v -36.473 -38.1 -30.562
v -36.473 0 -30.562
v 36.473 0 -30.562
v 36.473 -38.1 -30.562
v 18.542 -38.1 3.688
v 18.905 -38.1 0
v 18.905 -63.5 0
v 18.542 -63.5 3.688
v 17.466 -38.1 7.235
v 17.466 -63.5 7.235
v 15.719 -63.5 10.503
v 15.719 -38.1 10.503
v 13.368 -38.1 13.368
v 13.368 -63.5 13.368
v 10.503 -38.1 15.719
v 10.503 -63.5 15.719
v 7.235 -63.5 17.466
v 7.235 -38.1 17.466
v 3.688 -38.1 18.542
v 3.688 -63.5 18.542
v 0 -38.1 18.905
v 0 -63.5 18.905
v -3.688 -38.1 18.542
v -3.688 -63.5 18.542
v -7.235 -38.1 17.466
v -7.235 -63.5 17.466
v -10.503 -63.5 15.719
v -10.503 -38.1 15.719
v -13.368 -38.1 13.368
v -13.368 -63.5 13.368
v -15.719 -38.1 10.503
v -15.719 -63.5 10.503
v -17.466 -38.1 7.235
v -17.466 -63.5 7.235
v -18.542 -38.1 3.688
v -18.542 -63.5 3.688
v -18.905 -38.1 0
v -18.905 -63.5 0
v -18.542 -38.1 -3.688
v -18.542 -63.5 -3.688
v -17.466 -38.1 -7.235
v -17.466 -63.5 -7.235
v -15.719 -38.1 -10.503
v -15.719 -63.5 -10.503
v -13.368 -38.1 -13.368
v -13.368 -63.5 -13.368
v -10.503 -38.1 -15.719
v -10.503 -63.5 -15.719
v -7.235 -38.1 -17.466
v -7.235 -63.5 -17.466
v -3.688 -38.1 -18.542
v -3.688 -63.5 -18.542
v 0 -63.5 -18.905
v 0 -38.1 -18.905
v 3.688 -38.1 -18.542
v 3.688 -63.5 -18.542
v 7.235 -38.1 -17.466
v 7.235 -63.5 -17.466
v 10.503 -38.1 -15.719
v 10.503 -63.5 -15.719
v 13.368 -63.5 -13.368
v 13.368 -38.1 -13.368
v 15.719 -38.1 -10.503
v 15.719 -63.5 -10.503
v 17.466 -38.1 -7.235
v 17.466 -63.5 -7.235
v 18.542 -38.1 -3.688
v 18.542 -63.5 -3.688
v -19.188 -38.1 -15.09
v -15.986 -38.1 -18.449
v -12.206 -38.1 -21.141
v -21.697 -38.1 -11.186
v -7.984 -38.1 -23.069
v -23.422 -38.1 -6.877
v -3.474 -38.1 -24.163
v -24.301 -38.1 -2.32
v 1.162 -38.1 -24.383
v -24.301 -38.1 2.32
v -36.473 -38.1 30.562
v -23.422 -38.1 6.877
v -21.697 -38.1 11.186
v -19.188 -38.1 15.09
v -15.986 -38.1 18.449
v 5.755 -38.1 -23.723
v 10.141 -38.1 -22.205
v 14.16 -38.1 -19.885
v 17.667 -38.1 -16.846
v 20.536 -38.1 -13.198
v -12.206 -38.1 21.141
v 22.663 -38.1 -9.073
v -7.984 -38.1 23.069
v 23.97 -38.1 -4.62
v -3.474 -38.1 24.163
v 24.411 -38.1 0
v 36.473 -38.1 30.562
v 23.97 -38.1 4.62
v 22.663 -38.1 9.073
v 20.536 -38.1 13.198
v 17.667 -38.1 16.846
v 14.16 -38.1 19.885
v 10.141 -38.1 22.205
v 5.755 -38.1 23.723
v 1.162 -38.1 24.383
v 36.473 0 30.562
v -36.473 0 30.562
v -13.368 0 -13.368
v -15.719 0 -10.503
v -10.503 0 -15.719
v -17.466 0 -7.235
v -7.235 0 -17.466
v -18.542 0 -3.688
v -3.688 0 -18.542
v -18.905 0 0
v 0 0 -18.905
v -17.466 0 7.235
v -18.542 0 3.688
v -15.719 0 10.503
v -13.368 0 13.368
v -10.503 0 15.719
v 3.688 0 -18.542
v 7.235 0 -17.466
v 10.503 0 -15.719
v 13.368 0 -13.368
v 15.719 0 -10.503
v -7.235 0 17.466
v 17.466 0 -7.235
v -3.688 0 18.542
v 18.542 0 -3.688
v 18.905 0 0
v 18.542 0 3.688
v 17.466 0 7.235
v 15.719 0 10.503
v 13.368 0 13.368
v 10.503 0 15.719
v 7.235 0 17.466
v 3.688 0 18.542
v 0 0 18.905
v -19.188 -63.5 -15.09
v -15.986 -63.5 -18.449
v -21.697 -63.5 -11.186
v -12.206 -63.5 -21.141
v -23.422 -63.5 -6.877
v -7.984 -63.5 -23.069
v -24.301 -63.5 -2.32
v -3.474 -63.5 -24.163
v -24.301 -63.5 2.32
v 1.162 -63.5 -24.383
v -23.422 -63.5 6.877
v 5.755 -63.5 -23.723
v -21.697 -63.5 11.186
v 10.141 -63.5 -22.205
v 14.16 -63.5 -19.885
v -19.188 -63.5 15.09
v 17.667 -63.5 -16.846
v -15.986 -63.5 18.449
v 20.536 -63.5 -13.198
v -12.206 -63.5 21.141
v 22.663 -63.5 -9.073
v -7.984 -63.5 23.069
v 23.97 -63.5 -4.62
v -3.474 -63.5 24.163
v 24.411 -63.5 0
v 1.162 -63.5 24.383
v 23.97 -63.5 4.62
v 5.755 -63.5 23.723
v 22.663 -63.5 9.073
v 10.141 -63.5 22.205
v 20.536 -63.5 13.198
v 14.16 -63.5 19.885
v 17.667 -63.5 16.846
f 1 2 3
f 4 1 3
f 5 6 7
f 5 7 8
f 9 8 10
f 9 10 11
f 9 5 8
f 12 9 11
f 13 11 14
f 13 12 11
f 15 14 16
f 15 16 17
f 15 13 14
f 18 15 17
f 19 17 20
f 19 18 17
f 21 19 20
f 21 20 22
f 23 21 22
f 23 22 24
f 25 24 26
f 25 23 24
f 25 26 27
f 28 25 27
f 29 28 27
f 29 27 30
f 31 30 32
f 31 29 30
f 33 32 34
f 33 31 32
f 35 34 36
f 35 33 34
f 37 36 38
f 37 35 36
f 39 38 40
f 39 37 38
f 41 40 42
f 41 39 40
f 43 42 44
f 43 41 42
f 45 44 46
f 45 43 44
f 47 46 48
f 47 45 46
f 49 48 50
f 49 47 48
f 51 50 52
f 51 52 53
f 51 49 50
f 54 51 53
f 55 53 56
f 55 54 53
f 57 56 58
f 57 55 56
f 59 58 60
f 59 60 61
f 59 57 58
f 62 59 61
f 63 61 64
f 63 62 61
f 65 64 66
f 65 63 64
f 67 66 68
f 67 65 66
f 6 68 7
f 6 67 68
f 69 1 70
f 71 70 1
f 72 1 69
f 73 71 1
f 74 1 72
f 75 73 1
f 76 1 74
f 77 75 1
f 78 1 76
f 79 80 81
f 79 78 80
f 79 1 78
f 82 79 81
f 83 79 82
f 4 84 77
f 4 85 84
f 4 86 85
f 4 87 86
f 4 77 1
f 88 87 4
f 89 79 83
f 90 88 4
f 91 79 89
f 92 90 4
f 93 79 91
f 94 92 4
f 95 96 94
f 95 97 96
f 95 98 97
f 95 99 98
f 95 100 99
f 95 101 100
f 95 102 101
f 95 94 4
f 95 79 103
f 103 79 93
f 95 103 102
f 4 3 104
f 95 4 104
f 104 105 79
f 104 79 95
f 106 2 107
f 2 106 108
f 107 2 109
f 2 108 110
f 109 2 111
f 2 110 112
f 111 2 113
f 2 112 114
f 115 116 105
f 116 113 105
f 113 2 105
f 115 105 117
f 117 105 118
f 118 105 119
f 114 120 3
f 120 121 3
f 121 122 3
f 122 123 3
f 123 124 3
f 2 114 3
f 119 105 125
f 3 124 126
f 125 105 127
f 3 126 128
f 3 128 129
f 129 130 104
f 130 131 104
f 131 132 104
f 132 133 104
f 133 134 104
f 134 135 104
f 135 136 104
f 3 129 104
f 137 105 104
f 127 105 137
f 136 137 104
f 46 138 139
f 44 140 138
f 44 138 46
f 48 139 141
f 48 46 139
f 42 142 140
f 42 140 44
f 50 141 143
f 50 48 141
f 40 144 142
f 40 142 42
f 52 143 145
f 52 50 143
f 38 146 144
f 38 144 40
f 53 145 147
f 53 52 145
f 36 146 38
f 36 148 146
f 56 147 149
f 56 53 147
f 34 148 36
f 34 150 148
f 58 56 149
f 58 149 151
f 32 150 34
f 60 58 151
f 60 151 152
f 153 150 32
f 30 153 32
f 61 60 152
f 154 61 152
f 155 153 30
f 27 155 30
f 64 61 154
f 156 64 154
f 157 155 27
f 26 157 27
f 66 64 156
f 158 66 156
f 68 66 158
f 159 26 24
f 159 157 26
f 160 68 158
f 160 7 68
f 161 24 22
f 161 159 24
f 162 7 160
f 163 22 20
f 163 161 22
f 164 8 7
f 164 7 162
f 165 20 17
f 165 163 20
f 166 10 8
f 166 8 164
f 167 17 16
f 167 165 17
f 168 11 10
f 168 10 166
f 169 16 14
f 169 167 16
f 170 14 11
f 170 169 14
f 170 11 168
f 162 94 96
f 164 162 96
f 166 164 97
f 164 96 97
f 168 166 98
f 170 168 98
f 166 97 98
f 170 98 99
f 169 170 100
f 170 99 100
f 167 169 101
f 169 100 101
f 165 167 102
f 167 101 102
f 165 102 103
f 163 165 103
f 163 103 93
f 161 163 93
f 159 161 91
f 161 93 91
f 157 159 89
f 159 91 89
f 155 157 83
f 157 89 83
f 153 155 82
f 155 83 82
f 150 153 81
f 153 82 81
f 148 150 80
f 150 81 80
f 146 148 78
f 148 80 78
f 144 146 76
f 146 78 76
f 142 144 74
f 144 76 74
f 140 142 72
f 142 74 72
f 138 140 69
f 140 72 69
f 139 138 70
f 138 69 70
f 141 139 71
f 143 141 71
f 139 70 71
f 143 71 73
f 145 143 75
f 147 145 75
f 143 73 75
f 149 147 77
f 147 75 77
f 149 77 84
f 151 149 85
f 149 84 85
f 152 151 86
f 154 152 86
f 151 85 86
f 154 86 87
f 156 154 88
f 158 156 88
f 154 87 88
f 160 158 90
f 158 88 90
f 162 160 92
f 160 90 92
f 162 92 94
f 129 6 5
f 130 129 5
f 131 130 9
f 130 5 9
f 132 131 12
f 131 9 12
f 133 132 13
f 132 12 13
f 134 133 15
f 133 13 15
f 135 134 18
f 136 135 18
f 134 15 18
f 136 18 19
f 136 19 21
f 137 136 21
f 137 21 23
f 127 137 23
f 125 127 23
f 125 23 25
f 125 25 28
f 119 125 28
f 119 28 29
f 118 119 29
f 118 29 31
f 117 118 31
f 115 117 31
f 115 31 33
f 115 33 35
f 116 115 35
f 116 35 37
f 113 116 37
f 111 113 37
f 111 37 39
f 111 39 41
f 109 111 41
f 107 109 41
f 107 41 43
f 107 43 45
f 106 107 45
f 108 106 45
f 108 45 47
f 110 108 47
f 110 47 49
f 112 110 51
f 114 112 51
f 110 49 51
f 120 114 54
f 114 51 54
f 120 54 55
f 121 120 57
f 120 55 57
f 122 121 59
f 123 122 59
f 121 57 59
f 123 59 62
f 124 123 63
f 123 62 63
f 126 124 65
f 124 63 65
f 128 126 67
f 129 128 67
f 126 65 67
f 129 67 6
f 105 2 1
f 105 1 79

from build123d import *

# Parameters (mm, degrees)
F0_W     = 72.9460567236
F0_H     = 61.1247569323
F1_DEPTH = 38.1
F2_R     = 18.9050418051
F3_DEPTH = 50.8
F4_R     = 24.4111270382
F4_R_2   = 18.9050418051
F5_DEPTH = 25.4


with BuildPart() as f1:
    # F0 (on Front) → F1 (new body)
    with BuildSketch(Plane.XZ):
        Rectangle(F0_W, F0_H)
    extrude(amount=F1_DEPTH)

    # F2 (on face) → F3 (cut)
    with BuildSketch(Plane.XZ.offset(38.1)):
        Circle(F2_R)
    extrude(amount=-F3_DEPTH, mode=Mode.SUBTRACT)

    # F4 (on face) → F5 (join)
    with BuildSketch(Plane.XZ.offset(38.1)):
        Circle(F4_R)
        Circle(F4_R_2, mode=Mode.SUBTRACT)
    extrude(amount=F5_DEPTH)


solid = f1.part
